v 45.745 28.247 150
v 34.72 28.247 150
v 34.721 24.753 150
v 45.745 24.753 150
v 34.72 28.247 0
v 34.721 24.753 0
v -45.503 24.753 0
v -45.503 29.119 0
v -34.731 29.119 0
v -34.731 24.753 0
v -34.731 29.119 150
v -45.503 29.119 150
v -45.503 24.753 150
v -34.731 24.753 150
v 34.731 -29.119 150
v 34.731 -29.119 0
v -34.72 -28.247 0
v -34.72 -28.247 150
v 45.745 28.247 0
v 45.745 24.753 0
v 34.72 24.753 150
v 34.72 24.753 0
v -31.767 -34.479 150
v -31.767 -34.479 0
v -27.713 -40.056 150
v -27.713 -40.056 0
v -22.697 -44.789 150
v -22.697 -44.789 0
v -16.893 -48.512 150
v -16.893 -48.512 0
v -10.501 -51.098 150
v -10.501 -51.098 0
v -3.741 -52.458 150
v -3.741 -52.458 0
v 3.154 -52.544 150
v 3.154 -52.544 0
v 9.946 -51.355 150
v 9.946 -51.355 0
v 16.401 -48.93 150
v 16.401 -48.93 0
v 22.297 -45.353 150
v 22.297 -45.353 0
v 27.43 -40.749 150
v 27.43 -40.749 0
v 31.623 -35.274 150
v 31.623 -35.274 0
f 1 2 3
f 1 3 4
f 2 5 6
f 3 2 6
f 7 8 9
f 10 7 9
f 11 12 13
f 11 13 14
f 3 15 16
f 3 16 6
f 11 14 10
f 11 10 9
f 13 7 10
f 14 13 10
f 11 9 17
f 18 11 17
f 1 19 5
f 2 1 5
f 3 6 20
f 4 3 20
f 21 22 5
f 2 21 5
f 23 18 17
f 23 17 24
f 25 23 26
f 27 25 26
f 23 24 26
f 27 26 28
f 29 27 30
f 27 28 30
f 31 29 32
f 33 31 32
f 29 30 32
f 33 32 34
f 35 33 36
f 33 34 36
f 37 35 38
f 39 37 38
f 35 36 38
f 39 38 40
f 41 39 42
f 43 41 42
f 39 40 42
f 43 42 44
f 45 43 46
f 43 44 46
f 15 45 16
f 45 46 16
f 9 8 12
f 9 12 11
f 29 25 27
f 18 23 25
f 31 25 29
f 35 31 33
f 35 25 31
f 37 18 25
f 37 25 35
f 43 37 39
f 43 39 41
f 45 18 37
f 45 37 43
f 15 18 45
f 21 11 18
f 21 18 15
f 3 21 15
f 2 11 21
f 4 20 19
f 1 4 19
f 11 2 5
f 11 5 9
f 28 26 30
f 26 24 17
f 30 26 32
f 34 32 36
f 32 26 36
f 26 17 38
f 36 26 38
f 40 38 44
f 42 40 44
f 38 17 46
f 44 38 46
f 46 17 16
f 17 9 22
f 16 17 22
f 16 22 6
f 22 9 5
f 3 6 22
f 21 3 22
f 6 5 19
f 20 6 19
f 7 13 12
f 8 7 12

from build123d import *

# Parameters (mm, degrees)
F0_W     = 10.7713027203
F0_H     = 4.3658324032
F1_DEPTH = 150


with BuildPart() as f1:
    # F0 (on Top) → F1 (new body)
    with BuildSketch(Plane.XY):
        with Locations((-40.1170448261, 26.9363843127)):
            Rectangle(F0_W, F0_H)
    extrude(amount=F1_DEPTH)


with BuildPart() as f1b:
    # F0 (on Top) → F1, piece 2 (new body)
    with BuildSketch(Plane.XY):
        with BuildLine():
            Line((34.7202808191, 24.7534681112), (34.7202808191, 28.2474904971))
            Line((34.7202808191, 28.2474904971), (-34.731393466, 29.1193005143))
            Line((-34.731393466, 29.1193005143), (-34.7202808191, -28.2474904971))
            ThreePointArc((-34.7202808191, -28.2474904971), (-0.29543402, -52.661421541), (34.731393466, -29.1193005143))
            Line((34.731393466, -29.1193005143), (34.7209576539, 24.7534681112))
            Line((34.7209576539, 24.7534681112), (34.7202808191, 24.7534681112))
        make_face()
    extrude(amount=F1_DEPTH)


with BuildPart() as f1c:
    # F0 (on Top) → F1, piece 3 (new body)
    with BuildSketch(Plane.XY):
        Polygon((45.7453764975, 28.2474904971), (34.7202808191, 28.2474904971), (34.7209576539, 24.7534681112), (45.7453764975, 24.7534681112), align=None)
    extrude(amount=F1_DEPTH)


solid = Compound([f1.part, f1b.part, f1c.part])
